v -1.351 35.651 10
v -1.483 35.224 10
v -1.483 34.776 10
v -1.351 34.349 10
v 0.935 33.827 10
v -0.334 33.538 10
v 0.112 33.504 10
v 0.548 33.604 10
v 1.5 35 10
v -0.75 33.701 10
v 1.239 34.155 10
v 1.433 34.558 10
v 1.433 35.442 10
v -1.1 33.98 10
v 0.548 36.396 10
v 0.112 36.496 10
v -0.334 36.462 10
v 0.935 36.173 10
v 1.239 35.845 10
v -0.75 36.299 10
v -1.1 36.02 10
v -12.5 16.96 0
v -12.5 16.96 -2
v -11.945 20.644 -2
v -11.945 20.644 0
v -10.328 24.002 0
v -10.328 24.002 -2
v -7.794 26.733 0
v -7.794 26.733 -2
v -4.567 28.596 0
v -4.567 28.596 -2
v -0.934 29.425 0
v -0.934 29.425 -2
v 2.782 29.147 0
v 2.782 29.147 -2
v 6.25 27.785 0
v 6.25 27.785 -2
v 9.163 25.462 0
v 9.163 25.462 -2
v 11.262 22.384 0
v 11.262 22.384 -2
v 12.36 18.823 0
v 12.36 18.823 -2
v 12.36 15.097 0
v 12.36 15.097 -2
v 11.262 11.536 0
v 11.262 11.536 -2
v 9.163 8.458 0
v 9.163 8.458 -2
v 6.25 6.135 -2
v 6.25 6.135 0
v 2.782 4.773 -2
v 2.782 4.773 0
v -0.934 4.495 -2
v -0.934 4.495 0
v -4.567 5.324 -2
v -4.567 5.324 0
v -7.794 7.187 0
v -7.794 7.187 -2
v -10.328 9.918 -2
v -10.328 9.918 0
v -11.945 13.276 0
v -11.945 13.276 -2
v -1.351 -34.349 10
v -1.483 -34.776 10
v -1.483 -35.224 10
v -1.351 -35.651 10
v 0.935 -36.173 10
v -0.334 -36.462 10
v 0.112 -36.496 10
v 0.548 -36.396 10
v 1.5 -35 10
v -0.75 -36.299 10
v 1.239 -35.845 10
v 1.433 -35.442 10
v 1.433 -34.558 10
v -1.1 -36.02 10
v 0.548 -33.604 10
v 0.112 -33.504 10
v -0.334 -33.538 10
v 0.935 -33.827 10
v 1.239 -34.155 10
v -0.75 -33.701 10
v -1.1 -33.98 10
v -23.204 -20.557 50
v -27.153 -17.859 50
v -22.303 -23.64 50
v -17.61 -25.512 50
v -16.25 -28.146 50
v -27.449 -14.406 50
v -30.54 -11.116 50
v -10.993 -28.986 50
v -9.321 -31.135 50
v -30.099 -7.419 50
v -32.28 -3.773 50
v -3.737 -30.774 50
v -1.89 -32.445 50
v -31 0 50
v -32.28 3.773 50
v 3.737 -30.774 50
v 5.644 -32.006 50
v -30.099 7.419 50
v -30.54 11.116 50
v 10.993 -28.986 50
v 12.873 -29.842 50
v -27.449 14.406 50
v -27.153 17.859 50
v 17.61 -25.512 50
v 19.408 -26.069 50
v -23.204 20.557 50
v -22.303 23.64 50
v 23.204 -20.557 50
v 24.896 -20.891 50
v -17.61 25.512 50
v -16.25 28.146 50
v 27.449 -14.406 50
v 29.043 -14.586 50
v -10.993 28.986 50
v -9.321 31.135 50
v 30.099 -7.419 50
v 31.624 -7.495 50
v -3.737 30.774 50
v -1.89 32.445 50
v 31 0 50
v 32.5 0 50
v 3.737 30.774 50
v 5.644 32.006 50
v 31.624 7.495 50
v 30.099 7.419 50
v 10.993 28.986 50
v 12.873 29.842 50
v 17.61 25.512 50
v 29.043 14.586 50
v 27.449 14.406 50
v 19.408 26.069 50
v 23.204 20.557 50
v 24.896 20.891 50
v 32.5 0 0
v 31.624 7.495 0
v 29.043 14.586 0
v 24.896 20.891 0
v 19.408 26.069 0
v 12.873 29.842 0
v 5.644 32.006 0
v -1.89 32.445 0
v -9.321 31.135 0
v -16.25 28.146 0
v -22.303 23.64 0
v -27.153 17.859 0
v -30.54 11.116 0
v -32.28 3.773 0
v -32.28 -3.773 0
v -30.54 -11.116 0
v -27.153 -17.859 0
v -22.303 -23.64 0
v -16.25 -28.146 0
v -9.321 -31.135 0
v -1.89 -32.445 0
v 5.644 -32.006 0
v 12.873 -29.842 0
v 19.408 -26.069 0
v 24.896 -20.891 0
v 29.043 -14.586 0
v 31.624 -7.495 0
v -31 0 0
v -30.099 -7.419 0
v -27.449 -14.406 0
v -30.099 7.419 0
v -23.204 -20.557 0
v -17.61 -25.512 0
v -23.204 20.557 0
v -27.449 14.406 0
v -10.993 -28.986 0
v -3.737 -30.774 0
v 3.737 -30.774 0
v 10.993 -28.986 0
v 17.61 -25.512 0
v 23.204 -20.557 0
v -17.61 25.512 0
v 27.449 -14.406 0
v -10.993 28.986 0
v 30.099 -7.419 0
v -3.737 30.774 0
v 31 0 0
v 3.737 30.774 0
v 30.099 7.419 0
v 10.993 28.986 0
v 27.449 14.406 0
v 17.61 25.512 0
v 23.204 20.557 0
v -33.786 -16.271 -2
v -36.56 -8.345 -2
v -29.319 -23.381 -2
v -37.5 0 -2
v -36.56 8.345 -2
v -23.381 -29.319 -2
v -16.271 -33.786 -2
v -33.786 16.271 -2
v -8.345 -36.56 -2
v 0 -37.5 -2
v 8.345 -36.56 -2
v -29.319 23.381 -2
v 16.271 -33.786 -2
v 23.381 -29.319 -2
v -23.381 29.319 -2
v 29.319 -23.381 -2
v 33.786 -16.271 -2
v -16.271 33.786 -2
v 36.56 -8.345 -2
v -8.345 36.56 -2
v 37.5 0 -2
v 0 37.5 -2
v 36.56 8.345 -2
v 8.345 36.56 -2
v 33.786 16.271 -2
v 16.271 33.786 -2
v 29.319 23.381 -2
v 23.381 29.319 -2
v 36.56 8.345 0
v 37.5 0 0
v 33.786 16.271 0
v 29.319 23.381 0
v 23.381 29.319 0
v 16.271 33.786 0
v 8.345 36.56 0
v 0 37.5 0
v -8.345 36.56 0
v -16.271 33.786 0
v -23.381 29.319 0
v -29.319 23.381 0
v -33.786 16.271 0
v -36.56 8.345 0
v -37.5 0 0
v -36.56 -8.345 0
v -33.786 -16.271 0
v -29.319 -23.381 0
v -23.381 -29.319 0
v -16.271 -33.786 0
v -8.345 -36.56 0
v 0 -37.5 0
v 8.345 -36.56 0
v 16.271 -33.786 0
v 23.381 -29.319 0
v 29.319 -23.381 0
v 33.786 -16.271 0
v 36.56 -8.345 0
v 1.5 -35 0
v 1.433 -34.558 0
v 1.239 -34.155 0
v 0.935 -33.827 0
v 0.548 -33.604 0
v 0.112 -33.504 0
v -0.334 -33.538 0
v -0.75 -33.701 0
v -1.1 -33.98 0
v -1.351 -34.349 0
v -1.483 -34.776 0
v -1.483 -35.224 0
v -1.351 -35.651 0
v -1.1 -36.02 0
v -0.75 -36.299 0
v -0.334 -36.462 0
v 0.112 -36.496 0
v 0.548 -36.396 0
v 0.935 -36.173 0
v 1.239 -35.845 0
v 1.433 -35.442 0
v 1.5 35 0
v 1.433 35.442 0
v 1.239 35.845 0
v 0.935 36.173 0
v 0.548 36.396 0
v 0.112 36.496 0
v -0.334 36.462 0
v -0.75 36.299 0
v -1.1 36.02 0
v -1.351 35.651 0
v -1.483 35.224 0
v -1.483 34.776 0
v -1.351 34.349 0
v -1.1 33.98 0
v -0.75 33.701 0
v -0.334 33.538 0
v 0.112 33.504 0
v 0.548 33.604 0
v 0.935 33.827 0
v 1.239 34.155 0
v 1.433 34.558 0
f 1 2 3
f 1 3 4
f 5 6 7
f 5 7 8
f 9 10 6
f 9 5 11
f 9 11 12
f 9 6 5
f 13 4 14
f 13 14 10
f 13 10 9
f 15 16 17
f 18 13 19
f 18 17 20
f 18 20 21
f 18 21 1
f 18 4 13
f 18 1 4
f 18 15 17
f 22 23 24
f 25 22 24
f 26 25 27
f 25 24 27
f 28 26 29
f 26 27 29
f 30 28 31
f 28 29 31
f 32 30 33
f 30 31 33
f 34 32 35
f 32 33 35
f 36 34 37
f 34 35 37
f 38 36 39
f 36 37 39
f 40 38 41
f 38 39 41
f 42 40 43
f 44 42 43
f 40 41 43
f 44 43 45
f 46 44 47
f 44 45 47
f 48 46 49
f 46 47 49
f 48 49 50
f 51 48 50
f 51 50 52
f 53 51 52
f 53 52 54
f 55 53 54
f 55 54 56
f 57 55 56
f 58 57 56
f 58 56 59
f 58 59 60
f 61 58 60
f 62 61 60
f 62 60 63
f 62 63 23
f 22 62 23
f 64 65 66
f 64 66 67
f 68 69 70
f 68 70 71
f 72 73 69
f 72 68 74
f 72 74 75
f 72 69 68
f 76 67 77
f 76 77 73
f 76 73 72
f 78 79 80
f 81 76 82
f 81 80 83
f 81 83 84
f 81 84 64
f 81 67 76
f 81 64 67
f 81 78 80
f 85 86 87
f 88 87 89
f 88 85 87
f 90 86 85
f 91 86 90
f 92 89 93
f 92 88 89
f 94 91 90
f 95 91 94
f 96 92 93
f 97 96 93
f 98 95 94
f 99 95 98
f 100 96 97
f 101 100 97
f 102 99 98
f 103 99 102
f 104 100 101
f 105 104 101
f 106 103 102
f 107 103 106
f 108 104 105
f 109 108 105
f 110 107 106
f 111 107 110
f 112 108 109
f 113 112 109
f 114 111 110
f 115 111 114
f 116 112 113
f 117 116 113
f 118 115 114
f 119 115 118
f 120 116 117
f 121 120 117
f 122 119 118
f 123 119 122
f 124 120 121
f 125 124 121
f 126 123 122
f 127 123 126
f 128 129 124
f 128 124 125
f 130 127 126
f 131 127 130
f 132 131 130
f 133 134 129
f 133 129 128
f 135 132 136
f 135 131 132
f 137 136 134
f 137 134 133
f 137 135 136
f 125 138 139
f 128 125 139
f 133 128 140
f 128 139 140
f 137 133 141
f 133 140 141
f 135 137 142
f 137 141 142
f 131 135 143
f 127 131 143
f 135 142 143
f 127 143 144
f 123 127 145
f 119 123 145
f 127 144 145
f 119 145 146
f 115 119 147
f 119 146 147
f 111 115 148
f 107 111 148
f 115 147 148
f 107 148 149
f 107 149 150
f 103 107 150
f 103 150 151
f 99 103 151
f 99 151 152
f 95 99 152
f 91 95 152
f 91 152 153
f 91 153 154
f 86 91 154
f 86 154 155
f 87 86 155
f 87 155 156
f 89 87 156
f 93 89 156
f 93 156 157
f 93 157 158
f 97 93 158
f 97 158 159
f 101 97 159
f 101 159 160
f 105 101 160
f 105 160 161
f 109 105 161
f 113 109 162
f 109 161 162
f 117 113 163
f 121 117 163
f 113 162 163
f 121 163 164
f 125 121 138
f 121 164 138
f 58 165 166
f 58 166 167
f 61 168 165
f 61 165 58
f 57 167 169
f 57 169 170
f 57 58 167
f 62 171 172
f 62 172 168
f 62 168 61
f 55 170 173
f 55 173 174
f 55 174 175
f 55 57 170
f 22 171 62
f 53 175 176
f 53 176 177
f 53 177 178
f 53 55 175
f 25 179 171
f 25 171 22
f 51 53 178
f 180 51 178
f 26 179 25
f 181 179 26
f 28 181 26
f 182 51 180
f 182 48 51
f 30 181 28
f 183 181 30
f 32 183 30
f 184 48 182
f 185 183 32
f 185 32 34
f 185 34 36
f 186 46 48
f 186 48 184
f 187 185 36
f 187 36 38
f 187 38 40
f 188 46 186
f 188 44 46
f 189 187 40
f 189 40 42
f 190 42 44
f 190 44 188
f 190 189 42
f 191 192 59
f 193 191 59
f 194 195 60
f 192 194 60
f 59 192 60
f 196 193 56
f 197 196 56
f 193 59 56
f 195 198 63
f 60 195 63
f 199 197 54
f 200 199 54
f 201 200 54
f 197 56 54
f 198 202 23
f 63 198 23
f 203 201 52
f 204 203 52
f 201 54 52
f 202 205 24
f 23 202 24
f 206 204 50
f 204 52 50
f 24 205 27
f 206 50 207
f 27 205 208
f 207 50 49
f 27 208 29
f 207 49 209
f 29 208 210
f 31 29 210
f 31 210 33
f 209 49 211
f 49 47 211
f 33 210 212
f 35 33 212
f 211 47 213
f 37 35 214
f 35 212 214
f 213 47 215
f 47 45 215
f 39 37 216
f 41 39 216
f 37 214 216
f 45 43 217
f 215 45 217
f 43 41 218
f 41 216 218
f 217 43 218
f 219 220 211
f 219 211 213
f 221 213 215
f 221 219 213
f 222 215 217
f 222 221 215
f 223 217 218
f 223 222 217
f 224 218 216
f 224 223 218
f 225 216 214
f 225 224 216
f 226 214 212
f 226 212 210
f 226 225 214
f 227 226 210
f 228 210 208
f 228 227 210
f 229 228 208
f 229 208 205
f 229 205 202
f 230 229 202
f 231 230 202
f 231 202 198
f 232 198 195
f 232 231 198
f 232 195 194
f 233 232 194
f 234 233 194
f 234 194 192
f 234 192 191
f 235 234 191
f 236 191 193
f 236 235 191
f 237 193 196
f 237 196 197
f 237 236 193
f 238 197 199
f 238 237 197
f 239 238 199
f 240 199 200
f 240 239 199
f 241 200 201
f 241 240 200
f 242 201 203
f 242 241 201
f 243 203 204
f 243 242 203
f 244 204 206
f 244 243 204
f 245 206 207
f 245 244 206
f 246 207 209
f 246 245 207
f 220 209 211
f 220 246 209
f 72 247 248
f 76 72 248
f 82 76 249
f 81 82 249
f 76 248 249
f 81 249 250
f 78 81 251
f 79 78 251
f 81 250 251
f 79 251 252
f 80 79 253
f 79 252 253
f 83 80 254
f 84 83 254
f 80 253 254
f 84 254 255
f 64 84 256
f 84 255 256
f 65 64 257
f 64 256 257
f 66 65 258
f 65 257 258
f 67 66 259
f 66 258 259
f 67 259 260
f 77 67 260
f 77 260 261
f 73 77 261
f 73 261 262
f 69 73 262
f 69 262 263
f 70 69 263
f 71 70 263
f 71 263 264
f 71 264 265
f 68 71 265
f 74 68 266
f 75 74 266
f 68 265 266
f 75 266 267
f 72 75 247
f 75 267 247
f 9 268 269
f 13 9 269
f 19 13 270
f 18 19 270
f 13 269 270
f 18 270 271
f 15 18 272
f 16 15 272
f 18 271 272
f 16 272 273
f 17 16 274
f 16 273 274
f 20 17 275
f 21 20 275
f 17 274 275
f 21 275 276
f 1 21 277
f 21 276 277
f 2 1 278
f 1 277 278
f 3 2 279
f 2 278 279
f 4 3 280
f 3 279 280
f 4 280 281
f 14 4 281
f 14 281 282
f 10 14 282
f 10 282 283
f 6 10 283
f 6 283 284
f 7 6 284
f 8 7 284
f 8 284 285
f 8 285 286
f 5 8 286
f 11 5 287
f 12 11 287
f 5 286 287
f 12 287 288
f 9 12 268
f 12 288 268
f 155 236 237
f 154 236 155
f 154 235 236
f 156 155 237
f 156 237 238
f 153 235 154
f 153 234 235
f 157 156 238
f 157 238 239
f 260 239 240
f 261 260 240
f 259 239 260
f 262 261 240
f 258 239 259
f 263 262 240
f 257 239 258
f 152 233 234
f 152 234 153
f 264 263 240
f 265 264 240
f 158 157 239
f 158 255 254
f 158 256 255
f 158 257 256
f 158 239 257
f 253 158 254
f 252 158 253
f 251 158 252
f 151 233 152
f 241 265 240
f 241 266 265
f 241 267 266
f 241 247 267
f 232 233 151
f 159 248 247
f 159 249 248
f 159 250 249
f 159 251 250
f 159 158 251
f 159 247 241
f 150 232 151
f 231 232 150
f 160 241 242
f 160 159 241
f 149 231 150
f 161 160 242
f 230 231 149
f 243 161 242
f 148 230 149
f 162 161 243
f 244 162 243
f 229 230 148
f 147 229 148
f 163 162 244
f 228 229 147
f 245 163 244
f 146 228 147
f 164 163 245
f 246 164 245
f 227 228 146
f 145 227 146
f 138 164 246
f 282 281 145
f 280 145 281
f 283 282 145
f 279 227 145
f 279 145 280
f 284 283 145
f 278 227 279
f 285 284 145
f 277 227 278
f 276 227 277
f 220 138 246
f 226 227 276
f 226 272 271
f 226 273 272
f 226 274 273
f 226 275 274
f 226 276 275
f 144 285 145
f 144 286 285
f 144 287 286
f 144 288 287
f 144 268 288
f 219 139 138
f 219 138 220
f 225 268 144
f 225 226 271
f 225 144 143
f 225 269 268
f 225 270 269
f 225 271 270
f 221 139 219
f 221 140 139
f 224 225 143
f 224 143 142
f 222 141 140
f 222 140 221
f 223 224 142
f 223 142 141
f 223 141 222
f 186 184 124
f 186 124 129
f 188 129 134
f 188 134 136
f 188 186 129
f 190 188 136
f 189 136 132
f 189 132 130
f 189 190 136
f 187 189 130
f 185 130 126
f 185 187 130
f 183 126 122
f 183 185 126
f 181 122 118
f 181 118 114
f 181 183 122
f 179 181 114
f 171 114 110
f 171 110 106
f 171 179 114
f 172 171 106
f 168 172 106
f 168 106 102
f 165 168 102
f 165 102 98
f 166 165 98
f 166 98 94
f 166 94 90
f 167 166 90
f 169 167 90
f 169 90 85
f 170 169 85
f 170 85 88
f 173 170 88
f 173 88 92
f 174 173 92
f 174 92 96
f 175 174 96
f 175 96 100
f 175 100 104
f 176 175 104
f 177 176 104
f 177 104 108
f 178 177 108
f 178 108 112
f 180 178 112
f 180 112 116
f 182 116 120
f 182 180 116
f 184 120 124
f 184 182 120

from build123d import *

# Parameters (mm, degrees)
SKETCH1_R           = 37.5
SKETCH1_R_2         = 32.5
SKETCH1_R_3         = 31
BOSS_EXTRUDE1_DEPTH = 2
SKETCH2_R           = 32.5
SKETCH2_R_2         = 31
BOSS_EXTRUDE2_DEPTH = 55
SKETCH8_R           = 1.5
BOSS_EXTRUDE3_DEPTH = 10
CUT_EXTRUDE1_START  = -5
SKETCH9_R           = 32.5
SKETCH9_R_2         = 31
CUT_EXTRUDE1_DEPTH  = 5
SKETCH10_R          = 12.5
CUT_EXTRUDE3_DEPTH  = 100


with BuildPart() as part:
    # Sketch1 → Boss-Extrude1 (new body)
    # profile 1 of 3: a face of its own
    with BuildSketch(Plane.XY):
        Circle(SKETCH1_R)
        Circle(SKETCH1_R_2, mode=Mode.SUBTRACT)
    # profile 2 of 3: a face of its own
    with BuildSketch(Plane.XY):
        Circle(SKETCH1_R_2)
        Circle(SKETCH1_R_3, mode=Mode.SUBTRACT)
    # profile 3 of 3: a face of its own
    with BuildSketch(Plane.XY):
        Circle(SKETCH1_R_3)
    extrude(amount=-BOSS_EXTRUDE1_DEPTH)

    # Sketch2 → Boss-Extrude2 (add)
    with BuildSketch(Plane.XY):
        Circle(SKETCH2_R)
        Circle(SKETCH2_R_2, mode=Mode.SUBTRACT)
    extrude(amount=BOSS_EXTRUDE2_DEPTH)

    # Sketch8 → Boss-Extrude3 (add)
    with BuildSketch(Plane.XY):
        with Locations((0, 35)):
            Circle(SKETCH8_R)
        with Locations((0, -35)):
            Circle(SKETCH8_R)
    extrude(amount=BOSS_EXTRUDE3_DEPTH)

    # Sketch9 → Cut-Extrude1 (cut)
    with BuildSketch(Plane.XY.offset(55).offset(CUT_EXTRUDE1_START)):
        Circle(SKETCH9_R)
        Circle(SKETCH9_R_2, mode=Mode.SUBTRACT)
    extrude(amount=CUT_EXTRUDE1_DEPTH, mode=Mode.SUBTRACT)

    # Sketch10 → Cut-Extrude3 (cut)
    with BuildSketch(Plane(origin=(0, 0, -2), x_dir=(-1, 0, 0), z_dir=(0, 0, -1))):
        with Locations((0, 16.96)):
            Circle(SKETCH10_R)
    extrude(amount=-CUT_EXTRUDE3_DEPTH, mode=Mode.SUBTRACT)


solid = part.part
